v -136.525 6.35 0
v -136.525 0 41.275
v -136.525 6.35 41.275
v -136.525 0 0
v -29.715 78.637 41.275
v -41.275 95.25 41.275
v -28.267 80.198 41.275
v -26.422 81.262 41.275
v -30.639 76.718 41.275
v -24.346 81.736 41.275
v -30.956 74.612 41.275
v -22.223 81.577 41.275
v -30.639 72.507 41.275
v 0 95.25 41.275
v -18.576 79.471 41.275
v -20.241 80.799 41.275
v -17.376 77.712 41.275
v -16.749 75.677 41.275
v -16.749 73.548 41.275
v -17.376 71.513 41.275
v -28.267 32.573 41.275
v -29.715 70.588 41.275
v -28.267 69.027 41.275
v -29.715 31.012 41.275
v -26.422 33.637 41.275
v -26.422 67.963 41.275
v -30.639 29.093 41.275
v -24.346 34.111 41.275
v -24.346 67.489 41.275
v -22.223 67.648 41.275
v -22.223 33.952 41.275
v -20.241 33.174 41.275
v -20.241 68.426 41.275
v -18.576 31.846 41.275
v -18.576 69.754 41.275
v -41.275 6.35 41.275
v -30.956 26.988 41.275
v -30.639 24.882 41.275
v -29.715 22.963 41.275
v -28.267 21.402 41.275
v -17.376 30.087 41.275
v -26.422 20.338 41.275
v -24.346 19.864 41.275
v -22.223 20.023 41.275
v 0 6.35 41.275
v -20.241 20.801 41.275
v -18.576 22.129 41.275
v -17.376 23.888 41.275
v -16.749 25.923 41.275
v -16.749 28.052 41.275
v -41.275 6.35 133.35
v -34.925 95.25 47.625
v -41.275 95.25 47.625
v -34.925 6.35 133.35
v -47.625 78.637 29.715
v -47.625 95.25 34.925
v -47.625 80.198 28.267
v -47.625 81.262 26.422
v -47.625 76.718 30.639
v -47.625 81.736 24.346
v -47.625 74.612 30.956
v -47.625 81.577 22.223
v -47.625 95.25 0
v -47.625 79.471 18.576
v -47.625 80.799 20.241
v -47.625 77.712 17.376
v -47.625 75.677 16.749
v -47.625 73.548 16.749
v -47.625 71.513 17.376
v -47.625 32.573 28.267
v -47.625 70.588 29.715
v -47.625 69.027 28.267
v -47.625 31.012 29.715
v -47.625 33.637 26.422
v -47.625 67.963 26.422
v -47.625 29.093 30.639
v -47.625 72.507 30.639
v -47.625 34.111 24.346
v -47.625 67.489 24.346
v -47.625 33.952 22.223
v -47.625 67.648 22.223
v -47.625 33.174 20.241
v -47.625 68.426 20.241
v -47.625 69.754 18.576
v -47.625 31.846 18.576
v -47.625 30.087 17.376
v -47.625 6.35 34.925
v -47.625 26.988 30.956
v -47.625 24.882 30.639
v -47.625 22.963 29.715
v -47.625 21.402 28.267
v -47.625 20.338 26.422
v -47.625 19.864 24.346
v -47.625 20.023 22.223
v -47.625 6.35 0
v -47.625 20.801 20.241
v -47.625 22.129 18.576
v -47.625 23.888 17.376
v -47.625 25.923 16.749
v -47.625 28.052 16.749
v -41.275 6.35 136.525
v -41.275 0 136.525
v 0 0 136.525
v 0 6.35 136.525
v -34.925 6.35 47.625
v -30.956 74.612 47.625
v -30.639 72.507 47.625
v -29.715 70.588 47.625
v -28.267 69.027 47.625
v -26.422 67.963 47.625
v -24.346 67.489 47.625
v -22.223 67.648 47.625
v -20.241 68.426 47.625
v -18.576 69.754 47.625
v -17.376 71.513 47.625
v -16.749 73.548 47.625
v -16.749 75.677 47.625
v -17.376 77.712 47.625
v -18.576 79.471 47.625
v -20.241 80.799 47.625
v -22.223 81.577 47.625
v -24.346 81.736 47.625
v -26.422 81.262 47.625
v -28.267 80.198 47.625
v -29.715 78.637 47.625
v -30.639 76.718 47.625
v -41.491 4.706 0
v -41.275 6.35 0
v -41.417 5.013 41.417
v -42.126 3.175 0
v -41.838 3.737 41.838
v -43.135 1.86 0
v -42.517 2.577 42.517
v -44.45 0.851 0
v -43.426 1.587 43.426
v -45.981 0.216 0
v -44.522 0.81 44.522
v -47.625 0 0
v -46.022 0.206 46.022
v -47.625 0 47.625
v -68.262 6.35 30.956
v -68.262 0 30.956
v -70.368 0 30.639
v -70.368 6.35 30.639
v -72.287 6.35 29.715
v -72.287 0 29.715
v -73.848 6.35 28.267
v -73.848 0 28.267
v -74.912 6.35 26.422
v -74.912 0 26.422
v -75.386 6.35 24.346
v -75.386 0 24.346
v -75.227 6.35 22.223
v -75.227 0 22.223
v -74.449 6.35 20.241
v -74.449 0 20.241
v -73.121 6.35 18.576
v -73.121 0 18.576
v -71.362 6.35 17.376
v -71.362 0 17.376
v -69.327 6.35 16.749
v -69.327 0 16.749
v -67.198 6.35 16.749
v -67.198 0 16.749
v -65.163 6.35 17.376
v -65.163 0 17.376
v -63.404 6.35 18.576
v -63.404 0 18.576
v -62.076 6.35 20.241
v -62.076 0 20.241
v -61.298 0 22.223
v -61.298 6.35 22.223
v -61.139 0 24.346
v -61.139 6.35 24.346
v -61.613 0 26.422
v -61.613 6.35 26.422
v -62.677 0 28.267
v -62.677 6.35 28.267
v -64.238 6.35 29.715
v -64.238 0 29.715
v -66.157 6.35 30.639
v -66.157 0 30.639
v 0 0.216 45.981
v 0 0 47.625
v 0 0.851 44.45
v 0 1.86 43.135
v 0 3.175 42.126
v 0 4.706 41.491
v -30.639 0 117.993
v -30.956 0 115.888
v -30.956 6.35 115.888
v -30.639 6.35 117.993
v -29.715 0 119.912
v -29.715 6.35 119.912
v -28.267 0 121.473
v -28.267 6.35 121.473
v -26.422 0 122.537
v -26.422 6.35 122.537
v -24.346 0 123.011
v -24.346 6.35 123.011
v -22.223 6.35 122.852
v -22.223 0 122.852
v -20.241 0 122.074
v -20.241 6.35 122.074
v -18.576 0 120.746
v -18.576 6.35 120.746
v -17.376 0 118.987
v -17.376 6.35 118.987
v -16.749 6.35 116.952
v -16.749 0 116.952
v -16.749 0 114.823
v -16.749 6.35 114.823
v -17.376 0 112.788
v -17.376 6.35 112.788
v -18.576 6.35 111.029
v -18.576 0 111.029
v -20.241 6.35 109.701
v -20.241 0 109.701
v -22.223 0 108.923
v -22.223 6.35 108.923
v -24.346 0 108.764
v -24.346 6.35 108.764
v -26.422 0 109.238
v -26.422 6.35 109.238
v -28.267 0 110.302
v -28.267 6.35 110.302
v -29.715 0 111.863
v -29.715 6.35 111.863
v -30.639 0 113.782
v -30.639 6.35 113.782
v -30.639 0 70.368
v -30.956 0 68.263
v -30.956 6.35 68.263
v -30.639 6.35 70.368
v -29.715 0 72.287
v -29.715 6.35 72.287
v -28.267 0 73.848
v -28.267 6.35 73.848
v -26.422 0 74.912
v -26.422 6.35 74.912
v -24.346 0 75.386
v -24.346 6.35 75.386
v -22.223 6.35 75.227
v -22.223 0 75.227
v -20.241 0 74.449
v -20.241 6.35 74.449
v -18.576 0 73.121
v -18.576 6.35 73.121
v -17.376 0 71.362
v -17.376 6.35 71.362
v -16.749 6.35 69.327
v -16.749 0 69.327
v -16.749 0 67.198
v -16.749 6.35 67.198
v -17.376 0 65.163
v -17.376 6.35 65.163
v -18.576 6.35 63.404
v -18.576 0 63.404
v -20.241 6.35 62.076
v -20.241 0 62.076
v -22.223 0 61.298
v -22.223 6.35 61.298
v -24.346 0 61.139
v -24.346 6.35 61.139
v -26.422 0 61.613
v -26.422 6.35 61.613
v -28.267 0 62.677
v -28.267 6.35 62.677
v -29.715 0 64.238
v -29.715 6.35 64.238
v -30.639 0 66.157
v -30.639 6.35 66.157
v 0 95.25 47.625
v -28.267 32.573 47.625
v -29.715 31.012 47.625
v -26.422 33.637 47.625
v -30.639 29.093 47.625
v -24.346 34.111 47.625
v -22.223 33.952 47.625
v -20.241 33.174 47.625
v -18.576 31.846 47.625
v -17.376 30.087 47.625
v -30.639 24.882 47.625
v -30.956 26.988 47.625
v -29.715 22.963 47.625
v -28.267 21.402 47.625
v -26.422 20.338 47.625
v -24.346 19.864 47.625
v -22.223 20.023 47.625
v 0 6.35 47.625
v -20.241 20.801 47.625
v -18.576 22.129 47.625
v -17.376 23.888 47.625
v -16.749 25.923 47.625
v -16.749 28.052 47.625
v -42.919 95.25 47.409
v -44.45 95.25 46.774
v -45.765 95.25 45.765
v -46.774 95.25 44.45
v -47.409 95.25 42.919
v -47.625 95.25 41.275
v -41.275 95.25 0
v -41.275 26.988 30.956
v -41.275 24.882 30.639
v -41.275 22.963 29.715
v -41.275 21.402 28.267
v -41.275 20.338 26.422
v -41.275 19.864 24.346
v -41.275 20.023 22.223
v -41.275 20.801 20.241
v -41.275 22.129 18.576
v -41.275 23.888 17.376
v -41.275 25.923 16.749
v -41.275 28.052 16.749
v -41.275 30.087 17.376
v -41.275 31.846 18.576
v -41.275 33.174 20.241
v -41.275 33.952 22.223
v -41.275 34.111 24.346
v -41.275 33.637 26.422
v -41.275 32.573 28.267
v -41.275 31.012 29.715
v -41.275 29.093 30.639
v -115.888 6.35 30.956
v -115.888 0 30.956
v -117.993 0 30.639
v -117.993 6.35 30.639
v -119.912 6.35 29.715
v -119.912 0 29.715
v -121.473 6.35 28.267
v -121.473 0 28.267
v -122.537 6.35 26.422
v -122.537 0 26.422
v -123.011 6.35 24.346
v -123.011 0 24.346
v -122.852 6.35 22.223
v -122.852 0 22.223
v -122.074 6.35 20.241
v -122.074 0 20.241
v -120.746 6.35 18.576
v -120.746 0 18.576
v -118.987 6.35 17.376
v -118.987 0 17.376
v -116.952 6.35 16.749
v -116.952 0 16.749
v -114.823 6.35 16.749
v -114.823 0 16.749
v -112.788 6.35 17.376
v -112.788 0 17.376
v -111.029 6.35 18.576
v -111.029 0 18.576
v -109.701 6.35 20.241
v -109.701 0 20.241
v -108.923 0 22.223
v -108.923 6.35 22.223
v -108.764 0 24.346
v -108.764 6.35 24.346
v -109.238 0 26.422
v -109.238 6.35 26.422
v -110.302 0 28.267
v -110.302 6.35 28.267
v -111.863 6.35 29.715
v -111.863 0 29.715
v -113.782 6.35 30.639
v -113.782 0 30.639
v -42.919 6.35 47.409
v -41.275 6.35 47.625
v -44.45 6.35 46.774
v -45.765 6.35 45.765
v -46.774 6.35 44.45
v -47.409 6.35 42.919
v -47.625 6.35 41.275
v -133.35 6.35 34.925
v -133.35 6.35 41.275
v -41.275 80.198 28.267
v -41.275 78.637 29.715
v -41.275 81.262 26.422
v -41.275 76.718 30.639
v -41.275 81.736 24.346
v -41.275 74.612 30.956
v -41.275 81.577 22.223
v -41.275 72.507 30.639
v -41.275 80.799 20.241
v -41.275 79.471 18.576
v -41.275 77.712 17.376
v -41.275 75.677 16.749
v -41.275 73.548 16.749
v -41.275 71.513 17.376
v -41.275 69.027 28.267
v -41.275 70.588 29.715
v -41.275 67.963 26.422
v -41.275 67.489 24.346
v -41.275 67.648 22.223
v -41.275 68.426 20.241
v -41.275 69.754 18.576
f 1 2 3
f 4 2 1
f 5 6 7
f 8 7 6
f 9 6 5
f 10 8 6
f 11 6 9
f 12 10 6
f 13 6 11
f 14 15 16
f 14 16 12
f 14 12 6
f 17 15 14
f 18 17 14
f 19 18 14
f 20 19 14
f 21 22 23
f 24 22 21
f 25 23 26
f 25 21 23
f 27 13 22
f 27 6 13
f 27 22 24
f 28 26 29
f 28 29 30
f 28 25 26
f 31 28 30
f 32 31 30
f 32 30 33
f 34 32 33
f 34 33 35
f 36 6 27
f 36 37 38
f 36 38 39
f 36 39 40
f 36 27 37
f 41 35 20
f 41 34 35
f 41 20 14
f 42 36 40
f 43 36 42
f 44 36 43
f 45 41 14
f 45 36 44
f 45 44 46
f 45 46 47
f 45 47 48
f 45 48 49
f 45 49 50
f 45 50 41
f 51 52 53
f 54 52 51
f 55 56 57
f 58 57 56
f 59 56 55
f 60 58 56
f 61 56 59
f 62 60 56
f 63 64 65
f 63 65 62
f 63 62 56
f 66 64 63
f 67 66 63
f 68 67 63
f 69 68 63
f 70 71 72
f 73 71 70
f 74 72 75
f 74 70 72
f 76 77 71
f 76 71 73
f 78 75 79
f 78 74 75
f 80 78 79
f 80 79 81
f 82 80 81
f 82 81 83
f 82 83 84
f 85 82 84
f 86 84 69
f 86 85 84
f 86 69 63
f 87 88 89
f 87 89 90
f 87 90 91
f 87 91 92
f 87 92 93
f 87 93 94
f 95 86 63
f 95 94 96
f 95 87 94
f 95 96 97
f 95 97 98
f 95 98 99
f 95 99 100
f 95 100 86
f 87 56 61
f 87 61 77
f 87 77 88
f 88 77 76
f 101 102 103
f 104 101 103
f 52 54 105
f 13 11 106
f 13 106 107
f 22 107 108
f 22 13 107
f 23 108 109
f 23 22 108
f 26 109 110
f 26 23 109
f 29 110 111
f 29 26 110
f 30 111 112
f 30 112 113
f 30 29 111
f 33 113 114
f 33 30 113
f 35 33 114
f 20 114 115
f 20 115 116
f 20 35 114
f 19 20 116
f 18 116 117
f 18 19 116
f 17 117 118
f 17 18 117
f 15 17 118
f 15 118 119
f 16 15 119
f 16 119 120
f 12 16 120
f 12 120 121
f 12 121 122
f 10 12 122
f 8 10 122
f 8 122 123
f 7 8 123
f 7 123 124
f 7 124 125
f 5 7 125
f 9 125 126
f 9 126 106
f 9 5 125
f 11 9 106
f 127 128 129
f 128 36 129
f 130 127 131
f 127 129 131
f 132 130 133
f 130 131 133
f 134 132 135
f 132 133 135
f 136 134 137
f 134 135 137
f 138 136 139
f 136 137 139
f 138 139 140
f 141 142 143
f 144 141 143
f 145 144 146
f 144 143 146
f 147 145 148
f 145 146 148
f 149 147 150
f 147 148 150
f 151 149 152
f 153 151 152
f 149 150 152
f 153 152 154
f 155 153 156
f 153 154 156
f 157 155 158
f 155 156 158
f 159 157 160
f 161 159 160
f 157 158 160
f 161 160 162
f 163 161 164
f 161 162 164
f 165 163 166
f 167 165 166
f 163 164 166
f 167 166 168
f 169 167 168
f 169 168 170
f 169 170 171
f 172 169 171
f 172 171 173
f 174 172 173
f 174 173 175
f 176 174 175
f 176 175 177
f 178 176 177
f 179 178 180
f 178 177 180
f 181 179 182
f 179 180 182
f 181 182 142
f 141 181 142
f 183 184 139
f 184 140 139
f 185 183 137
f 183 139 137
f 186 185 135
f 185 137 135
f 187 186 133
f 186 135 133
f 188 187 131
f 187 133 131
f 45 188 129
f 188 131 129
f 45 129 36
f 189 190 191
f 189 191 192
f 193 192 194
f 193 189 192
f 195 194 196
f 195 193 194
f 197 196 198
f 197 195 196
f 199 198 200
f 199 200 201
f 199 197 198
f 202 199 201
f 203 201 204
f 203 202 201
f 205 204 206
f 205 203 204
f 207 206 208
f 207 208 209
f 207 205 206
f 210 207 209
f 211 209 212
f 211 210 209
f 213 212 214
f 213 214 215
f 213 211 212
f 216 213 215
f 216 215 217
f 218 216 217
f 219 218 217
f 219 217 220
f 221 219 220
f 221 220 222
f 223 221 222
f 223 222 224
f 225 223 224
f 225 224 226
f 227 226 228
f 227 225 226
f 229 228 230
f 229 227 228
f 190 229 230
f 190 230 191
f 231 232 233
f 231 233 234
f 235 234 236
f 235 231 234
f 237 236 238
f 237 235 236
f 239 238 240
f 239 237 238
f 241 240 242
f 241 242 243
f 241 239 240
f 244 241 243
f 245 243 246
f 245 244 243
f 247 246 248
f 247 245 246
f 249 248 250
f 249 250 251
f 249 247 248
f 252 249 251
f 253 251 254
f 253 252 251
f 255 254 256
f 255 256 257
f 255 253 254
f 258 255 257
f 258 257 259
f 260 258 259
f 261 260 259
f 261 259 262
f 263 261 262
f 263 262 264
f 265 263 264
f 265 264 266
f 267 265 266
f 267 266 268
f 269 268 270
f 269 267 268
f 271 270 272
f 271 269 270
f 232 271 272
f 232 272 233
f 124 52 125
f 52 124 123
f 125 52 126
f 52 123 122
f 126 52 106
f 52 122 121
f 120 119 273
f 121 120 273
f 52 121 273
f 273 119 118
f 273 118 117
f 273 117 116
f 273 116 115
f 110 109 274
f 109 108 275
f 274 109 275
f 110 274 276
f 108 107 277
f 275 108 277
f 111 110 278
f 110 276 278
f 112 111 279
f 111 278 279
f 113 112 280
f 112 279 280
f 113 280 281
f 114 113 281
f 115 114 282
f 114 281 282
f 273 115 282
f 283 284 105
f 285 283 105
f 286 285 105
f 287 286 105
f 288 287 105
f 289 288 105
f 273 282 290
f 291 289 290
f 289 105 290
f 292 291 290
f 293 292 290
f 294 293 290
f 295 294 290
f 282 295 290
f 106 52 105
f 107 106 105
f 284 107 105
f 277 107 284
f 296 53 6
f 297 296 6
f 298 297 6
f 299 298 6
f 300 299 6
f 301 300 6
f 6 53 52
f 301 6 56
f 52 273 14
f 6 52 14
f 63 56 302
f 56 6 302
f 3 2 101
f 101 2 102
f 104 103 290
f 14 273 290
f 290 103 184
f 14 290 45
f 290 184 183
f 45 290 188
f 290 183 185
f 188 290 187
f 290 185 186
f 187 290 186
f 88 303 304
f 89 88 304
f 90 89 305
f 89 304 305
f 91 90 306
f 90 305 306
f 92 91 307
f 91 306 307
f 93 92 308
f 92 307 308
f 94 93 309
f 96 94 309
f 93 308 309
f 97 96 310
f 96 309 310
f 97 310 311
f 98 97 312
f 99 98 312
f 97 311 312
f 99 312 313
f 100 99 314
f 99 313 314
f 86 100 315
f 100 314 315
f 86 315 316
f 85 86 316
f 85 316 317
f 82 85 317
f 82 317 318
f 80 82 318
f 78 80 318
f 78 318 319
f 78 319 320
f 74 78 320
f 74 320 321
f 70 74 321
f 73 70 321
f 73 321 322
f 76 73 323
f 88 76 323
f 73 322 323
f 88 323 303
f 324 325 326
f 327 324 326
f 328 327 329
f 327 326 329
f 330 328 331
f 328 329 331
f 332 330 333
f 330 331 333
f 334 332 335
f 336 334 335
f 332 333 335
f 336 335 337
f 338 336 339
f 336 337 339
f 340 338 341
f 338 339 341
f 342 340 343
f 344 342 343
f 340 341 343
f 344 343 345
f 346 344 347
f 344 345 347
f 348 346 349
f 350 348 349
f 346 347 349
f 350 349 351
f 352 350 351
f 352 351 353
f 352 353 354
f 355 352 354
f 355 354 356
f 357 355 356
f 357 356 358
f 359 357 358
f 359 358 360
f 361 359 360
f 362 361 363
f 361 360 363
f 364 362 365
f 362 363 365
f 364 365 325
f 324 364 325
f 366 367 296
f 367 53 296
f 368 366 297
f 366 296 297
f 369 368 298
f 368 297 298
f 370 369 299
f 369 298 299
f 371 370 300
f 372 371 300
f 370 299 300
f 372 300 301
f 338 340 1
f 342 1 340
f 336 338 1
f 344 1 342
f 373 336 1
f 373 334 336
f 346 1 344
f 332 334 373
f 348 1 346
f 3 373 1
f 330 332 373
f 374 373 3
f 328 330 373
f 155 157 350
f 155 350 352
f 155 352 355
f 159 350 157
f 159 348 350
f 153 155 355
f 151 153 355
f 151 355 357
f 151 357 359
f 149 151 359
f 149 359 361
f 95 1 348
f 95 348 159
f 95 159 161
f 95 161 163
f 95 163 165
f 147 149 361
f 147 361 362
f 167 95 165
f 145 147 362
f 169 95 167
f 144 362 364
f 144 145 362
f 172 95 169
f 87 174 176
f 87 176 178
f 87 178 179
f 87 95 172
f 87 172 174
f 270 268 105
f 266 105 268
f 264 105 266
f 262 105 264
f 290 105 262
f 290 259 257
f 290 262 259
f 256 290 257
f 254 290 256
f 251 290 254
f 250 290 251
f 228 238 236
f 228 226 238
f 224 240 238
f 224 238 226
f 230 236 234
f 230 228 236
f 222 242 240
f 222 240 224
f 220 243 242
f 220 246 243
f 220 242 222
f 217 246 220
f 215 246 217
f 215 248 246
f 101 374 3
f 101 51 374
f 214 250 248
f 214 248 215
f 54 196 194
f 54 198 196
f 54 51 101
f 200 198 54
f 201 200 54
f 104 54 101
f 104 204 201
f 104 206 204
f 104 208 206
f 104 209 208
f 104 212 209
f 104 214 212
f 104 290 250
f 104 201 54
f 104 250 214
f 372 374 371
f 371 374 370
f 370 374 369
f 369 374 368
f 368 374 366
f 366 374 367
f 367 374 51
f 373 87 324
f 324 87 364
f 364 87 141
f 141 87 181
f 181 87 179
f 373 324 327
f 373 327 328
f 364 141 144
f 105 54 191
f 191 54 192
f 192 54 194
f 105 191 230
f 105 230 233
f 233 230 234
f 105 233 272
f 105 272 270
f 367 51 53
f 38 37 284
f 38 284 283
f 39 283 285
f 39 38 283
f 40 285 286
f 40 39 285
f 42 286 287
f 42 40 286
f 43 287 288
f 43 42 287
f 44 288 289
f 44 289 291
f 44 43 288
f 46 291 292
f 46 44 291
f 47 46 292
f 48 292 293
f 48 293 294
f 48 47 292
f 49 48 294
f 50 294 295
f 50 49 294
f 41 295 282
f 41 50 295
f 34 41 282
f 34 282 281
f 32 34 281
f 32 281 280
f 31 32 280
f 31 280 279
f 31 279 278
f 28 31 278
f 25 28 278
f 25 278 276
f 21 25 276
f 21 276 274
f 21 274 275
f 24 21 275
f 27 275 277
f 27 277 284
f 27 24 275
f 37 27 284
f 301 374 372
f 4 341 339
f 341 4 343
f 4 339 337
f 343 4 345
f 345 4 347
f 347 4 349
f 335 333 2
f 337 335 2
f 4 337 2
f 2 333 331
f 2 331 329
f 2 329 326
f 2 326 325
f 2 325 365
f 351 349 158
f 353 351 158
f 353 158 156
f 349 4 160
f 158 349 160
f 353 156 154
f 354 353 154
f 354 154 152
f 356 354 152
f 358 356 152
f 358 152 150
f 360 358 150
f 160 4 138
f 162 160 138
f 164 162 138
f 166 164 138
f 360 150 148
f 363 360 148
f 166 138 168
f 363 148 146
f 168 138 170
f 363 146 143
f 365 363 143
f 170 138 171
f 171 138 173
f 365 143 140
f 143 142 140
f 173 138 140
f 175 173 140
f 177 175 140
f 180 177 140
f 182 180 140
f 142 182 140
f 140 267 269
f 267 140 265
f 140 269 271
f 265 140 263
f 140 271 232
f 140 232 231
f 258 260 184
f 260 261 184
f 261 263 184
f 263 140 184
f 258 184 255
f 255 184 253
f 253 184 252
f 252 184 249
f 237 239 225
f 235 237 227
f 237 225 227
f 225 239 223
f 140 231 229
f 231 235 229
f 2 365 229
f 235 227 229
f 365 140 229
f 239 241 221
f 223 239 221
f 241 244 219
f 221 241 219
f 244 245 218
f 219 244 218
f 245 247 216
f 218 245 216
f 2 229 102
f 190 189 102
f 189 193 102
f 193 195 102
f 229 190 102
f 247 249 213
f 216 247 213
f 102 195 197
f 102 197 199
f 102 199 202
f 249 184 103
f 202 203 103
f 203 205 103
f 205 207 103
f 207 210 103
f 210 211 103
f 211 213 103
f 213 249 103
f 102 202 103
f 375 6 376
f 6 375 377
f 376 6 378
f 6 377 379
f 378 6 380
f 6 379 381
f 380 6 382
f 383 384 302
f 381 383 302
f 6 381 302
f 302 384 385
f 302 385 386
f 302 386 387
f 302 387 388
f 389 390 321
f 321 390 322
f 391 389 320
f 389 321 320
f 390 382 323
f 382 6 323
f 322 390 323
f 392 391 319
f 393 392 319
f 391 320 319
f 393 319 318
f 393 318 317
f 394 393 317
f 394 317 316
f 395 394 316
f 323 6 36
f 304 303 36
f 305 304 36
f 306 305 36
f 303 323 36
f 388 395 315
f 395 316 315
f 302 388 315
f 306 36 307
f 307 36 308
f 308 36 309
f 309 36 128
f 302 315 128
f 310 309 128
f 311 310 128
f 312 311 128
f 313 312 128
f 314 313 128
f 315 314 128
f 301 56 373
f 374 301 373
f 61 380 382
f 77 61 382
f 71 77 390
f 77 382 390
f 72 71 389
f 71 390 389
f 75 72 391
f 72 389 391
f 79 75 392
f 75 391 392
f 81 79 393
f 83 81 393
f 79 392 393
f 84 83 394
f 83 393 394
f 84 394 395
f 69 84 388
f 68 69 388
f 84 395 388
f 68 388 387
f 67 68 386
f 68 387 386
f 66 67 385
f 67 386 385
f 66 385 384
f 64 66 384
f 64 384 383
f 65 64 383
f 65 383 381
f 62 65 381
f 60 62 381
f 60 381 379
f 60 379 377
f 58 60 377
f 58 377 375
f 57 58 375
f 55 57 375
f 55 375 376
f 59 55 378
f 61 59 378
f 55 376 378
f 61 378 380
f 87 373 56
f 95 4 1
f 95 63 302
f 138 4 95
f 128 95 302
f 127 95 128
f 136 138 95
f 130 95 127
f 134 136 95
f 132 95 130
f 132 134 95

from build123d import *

# Parameters (mm, degrees)
BASE_PLATE_DEPTH      = 6.35
SKETCH2_W             = 6.35
SKETCH2_H             = 47.625
UPPER_LEAF_DEPTH      = 88.9
LOFT1_START           = 34.925
LOFT1_DEPTH           = 6.35
SKETCH10_W            = 7.14375
SKETCH10_H            = 47.62505
SKETCH10_AT_POINT_2_W = 7.14375
SKETCH10_AT_POINT_2_H = 47.62505
SKETCH10_AT_POINT_3_W = 7.14375
SKETCH10_AT_POINT_3_H = 47.62505
SKETCH10_AT_POINT_4_W = 7.14375
SKETCH10_AT_POINT_4_H = 47.62505
FILLET1_R             = 6.35


# Read off the part's stored shape, not the designer's step: Loft1, Mirror1
with BuildPart() as part:
    # Sketch1 → Base Plate (new body)
    with BuildSketch(Plane(origin=(0, 0, 0), x_dir=(1, 0, 0), z_dir=(0, 1, 0))):
        Polygon((-136.525, 0), (-41.275, 0), (-41.275, -41.275), (0, -41.275), (0, -136.525), (-41.275, -136.525), (-136.525, -41.275), align=None)
    extrude(amount=BASE_PLATE_DEPTH)

    # Sketch2 → Upper Leaf (add)
    with BuildSketch(Plane(origin=(0, 6.35, 0), x_dir=(1, 0, 0), z_dir=(0, 1, 0))):
        with Locations((-44.45, -23.8125)):
            Rectangle(SKETCH2_W, SKETCH2_H)
    extrude(amount=UPPER_LEAF_DEPTH)

    # Loft1 outline → Loft1 (add)
    with BuildSketch(Plane.XY.offset(LOFT1_START)):
        Polygon((-47.625, 6.35), (-47.625, 95.25), (-133.35, 6.35), align=None)
    extrude(amount=LOFT1_DEPTH)

    # Sketch10 → 9/16 (0.5625) Diameter Hole1 (revolve, cut)
    with BuildSketch(Plane(origin=(-47.625, 74.6125, 23.8125), x_dir=(0, 0, 1), z_dir=(0, 1, 0))):
        with Locations((3.571875, 23.812525)):
            Rectangle(SKETCH10_W, SKETCH10_H)
    revolve(axis=Axis((-53.975, 74.6125, 23.8125), (1, 0, 0)), mode=Mode.SUBTRACT)

    # Sketch10 at point 2 (carried to point 2, square into its face) → 9/16 (0.5625) Diameter Hole1 at 2 (revolve, cut)
    with BuildSketch(Plane(origin=(-47.625, 26.9875, 23.8125), x_dir=(0, 0, 1), z_dir=(0, 1, 0))):
        with Locations((3.571875, 23.812525)):
            Rectangle(SKETCH10_AT_POINT_2_W, SKETCH10_AT_POINT_2_H)
    revolve(axis=Axis((-53.975, 26.9875, 23.8125), (1, 0, 0)), mode=Mode.SUBTRACT)

    # Sketch10 at point 3 (carried to point 3, square into its face) → 9/16 (0.5625) Diameter Hole1 at 3 (revolve, cut)
    with BuildSketch(Plane(origin=(-68.2625, 6.35, 23.8125), x_dir=(0, 0, 1), z_dir=(1, 0, 0))):
        with Locations((3.571875, 23.812525)):
            Rectangle(SKETCH10_AT_POINT_3_W, SKETCH10_AT_POINT_3_H)
    revolve(axis=Axis((-68.2625, 12.7, 23.8125), (0, -1, 0)), mode=Mode.SUBTRACT)

    # Sketch10 at point 4 (carried to point 4, square into its face) → 9/16 (0.5625) Diameter Hole1 at 4 (revolve, cut)
    with BuildSketch(Plane(origin=(-115.8875, 6.35, 23.8125), x_dir=(0, 0, 1), z_dir=(1, 0, 0))):
        with Locations((3.571875, 23.812525)):
            Rectangle(SKETCH10_AT_POINT_4_W, SKETCH10_AT_POINT_4_H)
    revolve(axis=Axis((-115.8875, 12.7, 23.8125), (0, -1, 0)), mode=Mode.SUBTRACT)

    # Mirror1
    split(bisect_by=Plane(origin=(0, 0, 0), x_dir=(-0.7071067811865476, 0, 0.7071067811865476), z_dir=(0.7071067811865477, 0, 0.7071067811865475)), keep=Keep.BOTTOM)

    # Mirror1 2: part across plane


with BuildPart() as part_1:
    add(part.part)
    add(part.part.mirror(Plane(origin=(0, 0, 0), x_dir=(-0.7071067811865476, 0, 0.7071067811865476), z_dir=(0.7071067811865477, 0, 0.7071067811865475))))

    # Fillet1
    fillet1_edges = [part_1.edges().sort_by_distance(p)[0] for p in [
        (-41.275, 0, 20.6375),
        (-20.6375, 0, 41.275),
        (-47.625, 50.8, 47.625),
    ]]
    fillet(fillet1_edges, radius=FILLET1_R - 0.0001)  # a hair under: the kernel refuses the full size


solid = part_1.part
